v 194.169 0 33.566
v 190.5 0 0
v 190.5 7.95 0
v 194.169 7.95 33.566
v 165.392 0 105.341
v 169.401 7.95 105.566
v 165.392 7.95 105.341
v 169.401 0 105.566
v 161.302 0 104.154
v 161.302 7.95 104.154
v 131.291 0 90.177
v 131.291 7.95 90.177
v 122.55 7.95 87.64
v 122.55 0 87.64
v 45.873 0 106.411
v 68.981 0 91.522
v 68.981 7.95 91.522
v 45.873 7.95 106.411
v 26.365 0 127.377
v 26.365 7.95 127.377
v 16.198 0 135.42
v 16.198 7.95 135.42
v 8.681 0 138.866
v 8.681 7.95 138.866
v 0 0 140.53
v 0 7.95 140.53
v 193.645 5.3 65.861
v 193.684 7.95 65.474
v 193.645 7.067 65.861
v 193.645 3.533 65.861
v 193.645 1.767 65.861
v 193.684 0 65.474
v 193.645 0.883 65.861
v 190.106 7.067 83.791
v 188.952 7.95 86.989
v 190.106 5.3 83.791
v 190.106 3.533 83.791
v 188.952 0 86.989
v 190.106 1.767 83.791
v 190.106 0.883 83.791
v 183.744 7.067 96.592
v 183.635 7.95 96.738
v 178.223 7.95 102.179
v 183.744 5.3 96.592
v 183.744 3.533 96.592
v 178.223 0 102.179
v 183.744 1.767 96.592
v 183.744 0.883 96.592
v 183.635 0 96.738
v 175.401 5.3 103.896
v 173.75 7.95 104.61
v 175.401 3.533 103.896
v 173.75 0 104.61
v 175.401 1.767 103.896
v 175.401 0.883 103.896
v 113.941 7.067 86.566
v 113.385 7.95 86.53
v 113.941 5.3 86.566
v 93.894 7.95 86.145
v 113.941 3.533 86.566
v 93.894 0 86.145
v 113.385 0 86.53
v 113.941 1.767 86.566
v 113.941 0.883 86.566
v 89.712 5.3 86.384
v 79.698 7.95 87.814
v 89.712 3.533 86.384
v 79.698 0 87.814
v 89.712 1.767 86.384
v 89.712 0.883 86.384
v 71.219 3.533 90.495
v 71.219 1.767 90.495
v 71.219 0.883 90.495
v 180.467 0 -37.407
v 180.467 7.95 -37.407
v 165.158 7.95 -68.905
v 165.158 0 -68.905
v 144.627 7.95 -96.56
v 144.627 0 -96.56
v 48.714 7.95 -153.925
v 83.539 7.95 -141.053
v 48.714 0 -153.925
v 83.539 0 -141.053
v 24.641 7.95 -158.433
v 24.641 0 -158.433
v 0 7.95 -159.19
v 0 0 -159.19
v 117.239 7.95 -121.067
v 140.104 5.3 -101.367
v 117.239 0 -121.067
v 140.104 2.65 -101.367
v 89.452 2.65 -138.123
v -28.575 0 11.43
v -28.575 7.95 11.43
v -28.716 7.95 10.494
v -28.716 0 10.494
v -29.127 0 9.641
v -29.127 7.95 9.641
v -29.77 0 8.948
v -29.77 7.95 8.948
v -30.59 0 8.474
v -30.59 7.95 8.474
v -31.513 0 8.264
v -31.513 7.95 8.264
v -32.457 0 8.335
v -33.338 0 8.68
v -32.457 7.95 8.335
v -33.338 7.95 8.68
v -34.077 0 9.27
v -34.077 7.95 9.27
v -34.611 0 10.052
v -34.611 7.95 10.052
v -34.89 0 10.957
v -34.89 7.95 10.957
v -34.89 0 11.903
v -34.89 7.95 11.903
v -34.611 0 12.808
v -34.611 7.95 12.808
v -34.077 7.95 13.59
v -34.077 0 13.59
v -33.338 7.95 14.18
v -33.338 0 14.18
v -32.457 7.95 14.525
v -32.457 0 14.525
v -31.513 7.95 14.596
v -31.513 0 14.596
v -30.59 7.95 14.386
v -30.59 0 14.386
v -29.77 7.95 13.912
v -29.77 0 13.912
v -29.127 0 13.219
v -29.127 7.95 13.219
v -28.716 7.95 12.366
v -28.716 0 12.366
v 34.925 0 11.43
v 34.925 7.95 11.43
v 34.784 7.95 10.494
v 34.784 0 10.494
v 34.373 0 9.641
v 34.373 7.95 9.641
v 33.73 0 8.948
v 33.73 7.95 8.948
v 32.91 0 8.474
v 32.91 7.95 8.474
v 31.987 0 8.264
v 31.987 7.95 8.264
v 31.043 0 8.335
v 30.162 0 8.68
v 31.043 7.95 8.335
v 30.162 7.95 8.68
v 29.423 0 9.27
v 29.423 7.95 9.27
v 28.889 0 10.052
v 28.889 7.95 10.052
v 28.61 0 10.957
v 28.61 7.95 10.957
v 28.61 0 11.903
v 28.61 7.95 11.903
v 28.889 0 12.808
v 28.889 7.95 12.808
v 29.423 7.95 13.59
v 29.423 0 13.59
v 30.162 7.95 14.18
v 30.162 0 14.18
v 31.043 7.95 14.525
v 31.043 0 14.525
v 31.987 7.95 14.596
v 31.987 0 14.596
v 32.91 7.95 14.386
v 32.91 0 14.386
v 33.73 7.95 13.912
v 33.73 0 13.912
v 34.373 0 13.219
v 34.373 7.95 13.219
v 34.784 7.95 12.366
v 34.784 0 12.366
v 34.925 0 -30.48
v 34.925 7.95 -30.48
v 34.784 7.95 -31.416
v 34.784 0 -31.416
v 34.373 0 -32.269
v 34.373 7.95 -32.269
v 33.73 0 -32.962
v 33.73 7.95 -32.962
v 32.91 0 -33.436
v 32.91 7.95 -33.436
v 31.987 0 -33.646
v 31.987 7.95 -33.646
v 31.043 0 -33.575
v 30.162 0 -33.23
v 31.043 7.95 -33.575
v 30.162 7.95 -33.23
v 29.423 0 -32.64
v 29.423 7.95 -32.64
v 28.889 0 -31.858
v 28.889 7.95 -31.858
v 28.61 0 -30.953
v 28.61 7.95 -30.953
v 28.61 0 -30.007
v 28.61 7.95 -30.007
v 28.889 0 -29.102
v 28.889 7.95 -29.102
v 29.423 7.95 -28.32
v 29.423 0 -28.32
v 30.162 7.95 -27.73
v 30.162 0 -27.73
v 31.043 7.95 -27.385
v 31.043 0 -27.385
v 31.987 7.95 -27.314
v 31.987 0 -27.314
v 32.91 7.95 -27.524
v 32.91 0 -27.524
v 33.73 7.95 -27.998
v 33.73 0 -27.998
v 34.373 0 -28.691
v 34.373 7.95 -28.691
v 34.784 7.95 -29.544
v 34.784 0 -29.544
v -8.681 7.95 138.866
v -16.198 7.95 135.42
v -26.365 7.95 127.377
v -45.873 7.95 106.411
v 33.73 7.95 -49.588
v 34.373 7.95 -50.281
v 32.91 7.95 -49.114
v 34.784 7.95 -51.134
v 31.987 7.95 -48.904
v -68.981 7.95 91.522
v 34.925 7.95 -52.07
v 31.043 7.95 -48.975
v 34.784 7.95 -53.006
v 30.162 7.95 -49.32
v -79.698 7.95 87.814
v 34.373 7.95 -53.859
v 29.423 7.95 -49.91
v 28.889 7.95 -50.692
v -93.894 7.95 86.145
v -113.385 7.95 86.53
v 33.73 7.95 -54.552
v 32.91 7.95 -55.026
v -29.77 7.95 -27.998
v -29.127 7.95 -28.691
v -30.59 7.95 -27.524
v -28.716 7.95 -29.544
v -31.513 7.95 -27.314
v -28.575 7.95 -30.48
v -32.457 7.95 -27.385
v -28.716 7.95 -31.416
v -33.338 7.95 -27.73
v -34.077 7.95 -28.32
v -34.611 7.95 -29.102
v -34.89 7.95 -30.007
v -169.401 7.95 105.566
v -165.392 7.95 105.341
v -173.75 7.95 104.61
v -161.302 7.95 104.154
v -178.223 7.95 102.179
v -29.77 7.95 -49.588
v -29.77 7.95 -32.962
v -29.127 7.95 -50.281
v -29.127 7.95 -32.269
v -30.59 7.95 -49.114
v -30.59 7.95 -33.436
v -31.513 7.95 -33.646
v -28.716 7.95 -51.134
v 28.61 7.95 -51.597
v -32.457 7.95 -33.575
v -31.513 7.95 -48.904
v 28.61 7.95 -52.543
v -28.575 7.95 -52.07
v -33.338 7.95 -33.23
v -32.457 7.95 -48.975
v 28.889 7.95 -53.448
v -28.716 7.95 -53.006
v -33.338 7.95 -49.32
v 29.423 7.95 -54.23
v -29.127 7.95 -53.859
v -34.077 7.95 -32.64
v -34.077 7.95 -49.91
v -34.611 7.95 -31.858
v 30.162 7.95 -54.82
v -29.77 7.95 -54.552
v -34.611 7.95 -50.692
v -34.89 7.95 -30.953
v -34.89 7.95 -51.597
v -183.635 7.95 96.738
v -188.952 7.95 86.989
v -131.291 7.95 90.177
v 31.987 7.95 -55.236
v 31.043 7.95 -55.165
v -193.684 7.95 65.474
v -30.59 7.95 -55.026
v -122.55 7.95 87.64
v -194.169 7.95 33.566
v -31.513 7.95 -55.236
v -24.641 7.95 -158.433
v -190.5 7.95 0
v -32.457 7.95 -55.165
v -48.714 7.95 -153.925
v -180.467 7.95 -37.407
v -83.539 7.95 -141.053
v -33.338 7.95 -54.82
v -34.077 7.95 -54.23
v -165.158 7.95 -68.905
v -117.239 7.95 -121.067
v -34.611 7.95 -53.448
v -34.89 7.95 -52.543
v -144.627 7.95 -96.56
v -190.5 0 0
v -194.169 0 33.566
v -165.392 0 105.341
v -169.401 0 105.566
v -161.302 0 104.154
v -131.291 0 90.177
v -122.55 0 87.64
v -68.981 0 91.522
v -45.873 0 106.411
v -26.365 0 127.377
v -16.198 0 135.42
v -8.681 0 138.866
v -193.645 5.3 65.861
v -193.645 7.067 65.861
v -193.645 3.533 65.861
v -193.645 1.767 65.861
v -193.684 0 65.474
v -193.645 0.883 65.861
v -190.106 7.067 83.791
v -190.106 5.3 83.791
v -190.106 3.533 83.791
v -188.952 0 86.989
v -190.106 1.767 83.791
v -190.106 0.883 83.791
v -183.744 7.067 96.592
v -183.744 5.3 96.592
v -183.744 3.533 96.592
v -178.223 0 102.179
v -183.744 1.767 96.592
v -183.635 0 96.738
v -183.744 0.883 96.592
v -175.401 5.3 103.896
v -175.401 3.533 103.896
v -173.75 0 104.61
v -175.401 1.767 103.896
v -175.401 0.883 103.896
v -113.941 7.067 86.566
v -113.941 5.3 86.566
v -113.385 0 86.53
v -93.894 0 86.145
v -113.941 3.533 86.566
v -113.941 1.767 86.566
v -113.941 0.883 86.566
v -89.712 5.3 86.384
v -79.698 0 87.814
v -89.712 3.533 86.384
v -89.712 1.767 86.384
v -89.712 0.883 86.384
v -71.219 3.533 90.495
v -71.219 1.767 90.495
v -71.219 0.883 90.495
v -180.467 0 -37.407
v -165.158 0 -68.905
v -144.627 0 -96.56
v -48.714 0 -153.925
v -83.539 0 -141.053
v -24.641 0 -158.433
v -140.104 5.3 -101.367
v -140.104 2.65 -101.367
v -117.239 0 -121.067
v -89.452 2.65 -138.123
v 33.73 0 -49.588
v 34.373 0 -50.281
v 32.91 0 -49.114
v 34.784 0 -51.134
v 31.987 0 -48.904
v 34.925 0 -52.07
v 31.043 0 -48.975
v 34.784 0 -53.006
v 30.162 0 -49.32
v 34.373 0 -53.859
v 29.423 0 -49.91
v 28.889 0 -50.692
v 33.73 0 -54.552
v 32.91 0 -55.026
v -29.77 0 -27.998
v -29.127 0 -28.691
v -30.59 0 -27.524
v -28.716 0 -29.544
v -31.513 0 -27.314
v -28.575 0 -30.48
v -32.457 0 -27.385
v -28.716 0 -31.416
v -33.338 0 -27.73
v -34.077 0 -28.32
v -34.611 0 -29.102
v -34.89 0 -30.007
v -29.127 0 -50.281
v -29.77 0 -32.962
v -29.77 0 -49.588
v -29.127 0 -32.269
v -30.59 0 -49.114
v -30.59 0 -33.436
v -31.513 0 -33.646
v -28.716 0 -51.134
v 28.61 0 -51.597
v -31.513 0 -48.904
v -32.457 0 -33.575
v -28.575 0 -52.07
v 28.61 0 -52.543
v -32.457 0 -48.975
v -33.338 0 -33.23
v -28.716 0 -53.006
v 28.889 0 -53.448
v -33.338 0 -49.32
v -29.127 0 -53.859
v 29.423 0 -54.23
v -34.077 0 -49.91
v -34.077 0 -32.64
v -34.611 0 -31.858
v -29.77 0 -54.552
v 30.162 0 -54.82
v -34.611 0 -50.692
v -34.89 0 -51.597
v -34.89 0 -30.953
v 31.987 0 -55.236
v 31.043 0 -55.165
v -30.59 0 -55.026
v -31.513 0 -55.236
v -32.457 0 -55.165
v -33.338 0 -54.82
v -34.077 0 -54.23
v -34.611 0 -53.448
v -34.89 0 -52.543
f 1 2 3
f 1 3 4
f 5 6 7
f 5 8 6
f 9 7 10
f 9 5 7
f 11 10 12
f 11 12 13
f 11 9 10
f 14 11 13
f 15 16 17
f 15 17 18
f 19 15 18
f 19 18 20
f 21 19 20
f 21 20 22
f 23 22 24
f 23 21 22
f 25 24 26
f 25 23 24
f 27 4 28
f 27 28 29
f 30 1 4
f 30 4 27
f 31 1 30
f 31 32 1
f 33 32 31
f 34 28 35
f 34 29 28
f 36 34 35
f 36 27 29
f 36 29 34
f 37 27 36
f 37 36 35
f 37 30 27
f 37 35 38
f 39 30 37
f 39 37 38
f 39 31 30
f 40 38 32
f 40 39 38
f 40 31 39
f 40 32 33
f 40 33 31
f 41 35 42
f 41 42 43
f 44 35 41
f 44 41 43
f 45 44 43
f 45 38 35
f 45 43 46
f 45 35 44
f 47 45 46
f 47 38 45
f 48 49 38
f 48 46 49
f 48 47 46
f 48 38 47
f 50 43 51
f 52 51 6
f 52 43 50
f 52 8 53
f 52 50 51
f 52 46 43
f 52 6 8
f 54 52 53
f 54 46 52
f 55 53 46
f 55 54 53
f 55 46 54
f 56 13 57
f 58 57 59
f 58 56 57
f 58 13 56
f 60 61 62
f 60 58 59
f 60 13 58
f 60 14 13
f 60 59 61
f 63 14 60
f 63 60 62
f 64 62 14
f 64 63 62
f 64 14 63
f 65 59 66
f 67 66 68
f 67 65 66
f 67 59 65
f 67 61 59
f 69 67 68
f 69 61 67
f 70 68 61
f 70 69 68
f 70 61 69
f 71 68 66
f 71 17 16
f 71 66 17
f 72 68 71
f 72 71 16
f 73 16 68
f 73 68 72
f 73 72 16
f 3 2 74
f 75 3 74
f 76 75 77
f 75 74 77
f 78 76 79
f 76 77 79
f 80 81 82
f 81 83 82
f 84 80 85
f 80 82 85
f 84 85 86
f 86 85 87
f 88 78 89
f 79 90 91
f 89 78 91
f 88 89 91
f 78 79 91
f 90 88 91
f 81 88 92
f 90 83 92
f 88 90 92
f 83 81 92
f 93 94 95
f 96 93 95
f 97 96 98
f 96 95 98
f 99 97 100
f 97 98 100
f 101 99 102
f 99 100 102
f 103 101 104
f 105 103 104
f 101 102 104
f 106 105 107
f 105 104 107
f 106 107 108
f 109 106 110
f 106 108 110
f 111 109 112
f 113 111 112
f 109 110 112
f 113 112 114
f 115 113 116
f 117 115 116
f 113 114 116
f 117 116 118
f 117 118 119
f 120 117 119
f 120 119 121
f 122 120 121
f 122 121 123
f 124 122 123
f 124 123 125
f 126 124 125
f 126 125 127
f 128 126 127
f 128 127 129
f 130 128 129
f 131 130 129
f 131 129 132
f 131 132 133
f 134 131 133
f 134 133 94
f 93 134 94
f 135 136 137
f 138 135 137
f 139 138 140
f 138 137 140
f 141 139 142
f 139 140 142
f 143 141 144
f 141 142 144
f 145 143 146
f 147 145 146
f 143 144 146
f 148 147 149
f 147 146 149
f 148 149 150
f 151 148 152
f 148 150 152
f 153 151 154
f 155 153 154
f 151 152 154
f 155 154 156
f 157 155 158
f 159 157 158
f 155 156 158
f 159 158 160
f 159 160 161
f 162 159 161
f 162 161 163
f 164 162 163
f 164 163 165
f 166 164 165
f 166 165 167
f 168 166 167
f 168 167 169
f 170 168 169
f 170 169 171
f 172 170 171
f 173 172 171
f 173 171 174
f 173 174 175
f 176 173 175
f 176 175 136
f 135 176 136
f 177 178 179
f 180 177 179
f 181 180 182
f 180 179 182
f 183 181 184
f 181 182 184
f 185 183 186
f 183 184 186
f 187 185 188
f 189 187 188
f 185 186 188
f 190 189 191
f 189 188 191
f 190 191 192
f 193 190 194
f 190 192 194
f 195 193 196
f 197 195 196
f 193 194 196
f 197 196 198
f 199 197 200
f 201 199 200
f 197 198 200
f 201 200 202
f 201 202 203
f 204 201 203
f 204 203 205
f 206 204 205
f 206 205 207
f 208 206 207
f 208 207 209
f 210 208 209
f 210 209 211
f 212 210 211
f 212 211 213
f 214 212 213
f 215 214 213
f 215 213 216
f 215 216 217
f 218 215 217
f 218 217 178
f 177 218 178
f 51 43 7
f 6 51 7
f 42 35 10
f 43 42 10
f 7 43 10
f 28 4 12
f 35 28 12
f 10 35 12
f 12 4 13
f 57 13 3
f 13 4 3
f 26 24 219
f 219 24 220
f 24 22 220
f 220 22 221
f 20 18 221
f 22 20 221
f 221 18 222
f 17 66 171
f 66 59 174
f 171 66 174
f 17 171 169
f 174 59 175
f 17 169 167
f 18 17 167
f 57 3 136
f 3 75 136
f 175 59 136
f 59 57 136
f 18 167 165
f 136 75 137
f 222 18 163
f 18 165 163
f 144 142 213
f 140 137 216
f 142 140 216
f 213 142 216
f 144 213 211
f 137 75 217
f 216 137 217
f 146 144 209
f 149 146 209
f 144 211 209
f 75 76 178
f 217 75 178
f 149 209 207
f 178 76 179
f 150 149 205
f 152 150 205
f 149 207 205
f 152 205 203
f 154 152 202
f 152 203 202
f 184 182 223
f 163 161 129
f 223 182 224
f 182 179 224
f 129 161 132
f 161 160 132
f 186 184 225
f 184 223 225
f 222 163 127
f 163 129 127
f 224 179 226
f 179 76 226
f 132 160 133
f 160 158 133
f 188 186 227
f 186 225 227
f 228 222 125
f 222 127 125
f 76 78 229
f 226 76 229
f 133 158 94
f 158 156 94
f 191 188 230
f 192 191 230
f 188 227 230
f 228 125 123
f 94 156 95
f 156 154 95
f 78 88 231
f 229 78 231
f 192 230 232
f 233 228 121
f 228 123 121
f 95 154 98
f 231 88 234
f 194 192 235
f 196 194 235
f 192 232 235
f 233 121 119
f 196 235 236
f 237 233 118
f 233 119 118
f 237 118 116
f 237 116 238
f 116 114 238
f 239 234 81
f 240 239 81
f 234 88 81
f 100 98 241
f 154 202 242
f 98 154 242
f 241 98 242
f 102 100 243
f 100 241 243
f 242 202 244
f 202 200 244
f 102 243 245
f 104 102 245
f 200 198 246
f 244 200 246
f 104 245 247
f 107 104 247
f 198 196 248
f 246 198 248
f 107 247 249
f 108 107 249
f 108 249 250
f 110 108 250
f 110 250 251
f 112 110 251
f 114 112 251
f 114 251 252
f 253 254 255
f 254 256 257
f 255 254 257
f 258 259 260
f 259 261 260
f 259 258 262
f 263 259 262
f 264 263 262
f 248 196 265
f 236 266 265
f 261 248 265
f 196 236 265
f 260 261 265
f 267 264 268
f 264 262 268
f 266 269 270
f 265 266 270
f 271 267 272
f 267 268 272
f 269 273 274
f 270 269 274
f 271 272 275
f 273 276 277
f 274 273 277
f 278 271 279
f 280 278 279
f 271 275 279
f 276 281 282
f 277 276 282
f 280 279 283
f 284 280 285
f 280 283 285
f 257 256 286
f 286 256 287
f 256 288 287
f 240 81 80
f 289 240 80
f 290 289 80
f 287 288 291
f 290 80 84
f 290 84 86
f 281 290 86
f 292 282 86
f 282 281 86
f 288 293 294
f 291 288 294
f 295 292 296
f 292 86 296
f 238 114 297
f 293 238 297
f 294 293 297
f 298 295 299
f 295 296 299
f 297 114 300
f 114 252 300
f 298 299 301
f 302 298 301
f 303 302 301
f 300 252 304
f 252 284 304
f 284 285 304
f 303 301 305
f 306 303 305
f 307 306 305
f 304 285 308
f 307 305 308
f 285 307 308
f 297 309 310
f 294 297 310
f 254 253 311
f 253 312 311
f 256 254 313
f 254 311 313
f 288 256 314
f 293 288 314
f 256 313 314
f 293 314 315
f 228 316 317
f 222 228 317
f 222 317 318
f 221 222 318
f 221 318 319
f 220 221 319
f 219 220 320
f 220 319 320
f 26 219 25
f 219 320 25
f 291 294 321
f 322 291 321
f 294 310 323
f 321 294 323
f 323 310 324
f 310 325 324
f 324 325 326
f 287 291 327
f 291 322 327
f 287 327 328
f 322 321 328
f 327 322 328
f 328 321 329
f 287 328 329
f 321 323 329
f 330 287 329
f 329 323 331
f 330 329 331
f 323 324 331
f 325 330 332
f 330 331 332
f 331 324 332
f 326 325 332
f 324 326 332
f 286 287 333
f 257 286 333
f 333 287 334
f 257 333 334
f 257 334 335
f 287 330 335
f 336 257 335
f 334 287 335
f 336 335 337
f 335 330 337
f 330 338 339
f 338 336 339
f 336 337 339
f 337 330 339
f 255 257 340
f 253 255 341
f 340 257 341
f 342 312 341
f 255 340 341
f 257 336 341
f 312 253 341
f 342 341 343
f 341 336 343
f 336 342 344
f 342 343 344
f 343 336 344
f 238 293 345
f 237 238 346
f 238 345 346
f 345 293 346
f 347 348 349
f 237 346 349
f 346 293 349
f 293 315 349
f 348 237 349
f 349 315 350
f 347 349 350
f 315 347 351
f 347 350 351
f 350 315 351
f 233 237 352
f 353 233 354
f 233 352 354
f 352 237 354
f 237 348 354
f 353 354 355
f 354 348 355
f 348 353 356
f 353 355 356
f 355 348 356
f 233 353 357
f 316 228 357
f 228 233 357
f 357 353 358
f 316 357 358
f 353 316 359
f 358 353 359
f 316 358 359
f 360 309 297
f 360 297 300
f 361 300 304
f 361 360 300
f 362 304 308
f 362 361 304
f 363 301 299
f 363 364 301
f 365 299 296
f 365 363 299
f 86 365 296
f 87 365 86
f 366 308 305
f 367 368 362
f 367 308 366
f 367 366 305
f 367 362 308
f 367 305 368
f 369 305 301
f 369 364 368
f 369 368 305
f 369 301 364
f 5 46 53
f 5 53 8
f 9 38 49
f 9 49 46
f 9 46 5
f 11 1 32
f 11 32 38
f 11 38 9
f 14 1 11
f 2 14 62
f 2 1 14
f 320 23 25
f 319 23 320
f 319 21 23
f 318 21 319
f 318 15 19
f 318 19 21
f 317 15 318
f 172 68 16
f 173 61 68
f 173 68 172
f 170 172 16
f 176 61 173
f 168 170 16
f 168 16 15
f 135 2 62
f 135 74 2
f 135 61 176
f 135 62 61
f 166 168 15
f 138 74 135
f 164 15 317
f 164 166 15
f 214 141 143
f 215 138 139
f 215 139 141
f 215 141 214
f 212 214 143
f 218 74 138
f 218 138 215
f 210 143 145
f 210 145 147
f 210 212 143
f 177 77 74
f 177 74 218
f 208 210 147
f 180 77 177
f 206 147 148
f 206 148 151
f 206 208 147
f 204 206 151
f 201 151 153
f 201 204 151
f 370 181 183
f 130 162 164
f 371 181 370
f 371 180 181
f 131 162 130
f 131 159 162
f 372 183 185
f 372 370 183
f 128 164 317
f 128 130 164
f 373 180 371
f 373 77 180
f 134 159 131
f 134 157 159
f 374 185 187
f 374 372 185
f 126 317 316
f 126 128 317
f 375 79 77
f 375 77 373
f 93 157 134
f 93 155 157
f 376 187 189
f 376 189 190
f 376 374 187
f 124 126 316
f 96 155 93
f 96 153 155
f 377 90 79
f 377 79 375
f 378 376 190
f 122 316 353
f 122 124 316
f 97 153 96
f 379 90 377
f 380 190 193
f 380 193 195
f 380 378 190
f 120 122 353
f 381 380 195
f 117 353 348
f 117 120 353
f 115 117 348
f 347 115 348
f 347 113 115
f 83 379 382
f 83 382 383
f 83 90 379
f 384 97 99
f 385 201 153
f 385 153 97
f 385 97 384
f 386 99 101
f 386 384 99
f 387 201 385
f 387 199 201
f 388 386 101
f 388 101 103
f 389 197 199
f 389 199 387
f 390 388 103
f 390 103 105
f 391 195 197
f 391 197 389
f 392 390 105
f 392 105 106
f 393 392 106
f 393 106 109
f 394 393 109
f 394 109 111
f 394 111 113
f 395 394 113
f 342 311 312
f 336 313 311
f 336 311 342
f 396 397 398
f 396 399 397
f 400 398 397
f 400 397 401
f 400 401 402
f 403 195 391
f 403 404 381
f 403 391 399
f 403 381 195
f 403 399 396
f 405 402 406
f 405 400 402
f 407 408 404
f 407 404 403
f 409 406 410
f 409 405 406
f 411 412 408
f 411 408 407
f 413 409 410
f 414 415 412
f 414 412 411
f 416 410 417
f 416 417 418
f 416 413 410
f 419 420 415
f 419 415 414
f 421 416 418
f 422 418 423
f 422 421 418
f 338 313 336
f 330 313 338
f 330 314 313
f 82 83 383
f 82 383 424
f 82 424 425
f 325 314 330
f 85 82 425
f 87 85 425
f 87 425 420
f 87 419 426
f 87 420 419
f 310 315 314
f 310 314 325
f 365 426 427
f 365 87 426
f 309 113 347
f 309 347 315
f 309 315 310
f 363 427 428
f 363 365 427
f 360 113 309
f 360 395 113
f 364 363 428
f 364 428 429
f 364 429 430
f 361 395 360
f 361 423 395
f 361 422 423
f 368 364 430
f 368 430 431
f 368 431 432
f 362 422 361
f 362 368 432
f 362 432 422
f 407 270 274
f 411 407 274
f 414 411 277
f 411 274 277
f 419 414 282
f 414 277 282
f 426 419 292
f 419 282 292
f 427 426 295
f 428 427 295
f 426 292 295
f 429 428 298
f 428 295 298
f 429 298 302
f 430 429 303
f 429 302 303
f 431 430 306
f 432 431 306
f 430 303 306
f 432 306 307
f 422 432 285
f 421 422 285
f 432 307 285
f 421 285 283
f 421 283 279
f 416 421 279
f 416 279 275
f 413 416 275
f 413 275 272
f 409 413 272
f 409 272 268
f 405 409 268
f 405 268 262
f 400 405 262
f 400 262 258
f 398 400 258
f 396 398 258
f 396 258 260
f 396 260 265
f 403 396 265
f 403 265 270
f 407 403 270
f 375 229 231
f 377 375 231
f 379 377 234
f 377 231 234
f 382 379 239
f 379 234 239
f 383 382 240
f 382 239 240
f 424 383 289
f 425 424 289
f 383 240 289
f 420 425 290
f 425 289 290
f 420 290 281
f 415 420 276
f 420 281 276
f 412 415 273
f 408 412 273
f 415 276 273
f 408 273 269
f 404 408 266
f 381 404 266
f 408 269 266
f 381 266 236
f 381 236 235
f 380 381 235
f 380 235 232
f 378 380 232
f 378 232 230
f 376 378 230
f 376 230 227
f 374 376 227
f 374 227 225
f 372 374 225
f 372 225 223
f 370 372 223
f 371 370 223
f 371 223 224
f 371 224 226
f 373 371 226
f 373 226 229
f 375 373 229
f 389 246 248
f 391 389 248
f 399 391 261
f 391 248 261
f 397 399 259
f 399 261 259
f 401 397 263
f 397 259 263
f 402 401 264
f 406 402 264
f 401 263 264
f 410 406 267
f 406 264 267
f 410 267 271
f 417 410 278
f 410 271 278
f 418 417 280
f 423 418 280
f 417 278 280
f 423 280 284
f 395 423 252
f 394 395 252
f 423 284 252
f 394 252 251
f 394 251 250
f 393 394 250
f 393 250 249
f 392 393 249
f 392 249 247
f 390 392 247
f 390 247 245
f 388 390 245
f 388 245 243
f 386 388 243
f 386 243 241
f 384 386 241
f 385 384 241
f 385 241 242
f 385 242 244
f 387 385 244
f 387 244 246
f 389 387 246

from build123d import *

# Parameters (mm, degrees)
BOSS_EXTRUDE1_DEPTH         = 7.9502
F_1_4_0_25_DIAMETER_HOLE1_D = 6.35


with BuildPart() as part:
    # Sketch3 → Boss-Extrude1 (new body)
    with BuildSketch(Plane(origin=(0, 0, 0), x_dir=(1, 0, 0), z_dir=(0, 1, 0))):
        with BuildLine():
            add(Edge.make_bspline(
                [(-190.5, 0), (-184.392726562, 37.537038237), (-157.261289847, 93.964093485), (-82.387478202, 146.622658841), (-31.311374143, 160.799884185), (0, 159.189909928)],
                knots=[0, 0, 0, 0, 0.424401366, 0.656369581, 1, 1, 1, 1], degree=3))
            add(Edge.make_bspline(
                [(190.5, 0), (184.392726562, 37.537038237), (157.261289847, 93.964093485), (82.387478202, 146.622658841), (31.311374143, 160.799884185), (0, 159.189909928)],
                knots=[0, 0, 0, 0, 0.424401366, 0.656369581, 1, 1, 1, 1], degree=3))
            add(Edge.make_bspline(
                [(190.5, 0), (192.064011793, -4.963501926), (201.967167766, -83.314618311), (174.696602041, -109.289958804), (151.630121659, -100.567984898), (131.410771519, -87.719783961), (96.843567628, -85.375403377), (78.692510144, -86.25882742), (58.833533072, -96.87938247), (37.30593461, -109.935798162), (21.349613946, -139.114767457), (0, -140.530090072)],
                knots=[0, 0, 0, 0, 0.166997052, 0.292320514, 0.319633117, 0.42673531, 0.45891405, 0.609241775, 0.641909704, 0.76680237, 1, 1, 1, 1], degree=3))
            add(Edge.make_bspline(
                [(-190.5, 0), (-192.064011793, -4.963501926), (-201.967167766, -83.314618311), (-174.696602041, -109.289958804), (-151.630121659, -100.567984898), (-131.410771519, -87.719783961), (-96.843567628, -85.375403377), (-78.692510144, -86.25882742), (-58.833533072, -96.87938247), (-37.30593461, -109.935798162), (-21.349613946, -139.114767457), (0, -140.530090072)],
                knots=[0, 0, 0, 0, 0.166997052, 0.292320514, 0.319633117, 0.42673531, 0.45891405, 0.609241775, 0.641909704, 0.76680237, 1, 1, 1, 1], degree=3))
        make_face()
    extrude(amount=BOSS_EXTRUDE1_DEPTH)

    # 1/4 (0.25) Diameter Hole1 (through all)
    with Locations(Plane(origin=(0, 0, 0), x_dir=(-1, 0, 0), z_dir=(0, -1, 0))):
        with Locations((-31.75, 52.07), (31.75, 52.07), (31.75, -11.43), (-31.75, -11.43), (-31.75, 30.48), (31.75, 30.48)):
            Hole(F_1_4_0_25_DIAMETER_HOLE1_D / 2)


solid = part.part
